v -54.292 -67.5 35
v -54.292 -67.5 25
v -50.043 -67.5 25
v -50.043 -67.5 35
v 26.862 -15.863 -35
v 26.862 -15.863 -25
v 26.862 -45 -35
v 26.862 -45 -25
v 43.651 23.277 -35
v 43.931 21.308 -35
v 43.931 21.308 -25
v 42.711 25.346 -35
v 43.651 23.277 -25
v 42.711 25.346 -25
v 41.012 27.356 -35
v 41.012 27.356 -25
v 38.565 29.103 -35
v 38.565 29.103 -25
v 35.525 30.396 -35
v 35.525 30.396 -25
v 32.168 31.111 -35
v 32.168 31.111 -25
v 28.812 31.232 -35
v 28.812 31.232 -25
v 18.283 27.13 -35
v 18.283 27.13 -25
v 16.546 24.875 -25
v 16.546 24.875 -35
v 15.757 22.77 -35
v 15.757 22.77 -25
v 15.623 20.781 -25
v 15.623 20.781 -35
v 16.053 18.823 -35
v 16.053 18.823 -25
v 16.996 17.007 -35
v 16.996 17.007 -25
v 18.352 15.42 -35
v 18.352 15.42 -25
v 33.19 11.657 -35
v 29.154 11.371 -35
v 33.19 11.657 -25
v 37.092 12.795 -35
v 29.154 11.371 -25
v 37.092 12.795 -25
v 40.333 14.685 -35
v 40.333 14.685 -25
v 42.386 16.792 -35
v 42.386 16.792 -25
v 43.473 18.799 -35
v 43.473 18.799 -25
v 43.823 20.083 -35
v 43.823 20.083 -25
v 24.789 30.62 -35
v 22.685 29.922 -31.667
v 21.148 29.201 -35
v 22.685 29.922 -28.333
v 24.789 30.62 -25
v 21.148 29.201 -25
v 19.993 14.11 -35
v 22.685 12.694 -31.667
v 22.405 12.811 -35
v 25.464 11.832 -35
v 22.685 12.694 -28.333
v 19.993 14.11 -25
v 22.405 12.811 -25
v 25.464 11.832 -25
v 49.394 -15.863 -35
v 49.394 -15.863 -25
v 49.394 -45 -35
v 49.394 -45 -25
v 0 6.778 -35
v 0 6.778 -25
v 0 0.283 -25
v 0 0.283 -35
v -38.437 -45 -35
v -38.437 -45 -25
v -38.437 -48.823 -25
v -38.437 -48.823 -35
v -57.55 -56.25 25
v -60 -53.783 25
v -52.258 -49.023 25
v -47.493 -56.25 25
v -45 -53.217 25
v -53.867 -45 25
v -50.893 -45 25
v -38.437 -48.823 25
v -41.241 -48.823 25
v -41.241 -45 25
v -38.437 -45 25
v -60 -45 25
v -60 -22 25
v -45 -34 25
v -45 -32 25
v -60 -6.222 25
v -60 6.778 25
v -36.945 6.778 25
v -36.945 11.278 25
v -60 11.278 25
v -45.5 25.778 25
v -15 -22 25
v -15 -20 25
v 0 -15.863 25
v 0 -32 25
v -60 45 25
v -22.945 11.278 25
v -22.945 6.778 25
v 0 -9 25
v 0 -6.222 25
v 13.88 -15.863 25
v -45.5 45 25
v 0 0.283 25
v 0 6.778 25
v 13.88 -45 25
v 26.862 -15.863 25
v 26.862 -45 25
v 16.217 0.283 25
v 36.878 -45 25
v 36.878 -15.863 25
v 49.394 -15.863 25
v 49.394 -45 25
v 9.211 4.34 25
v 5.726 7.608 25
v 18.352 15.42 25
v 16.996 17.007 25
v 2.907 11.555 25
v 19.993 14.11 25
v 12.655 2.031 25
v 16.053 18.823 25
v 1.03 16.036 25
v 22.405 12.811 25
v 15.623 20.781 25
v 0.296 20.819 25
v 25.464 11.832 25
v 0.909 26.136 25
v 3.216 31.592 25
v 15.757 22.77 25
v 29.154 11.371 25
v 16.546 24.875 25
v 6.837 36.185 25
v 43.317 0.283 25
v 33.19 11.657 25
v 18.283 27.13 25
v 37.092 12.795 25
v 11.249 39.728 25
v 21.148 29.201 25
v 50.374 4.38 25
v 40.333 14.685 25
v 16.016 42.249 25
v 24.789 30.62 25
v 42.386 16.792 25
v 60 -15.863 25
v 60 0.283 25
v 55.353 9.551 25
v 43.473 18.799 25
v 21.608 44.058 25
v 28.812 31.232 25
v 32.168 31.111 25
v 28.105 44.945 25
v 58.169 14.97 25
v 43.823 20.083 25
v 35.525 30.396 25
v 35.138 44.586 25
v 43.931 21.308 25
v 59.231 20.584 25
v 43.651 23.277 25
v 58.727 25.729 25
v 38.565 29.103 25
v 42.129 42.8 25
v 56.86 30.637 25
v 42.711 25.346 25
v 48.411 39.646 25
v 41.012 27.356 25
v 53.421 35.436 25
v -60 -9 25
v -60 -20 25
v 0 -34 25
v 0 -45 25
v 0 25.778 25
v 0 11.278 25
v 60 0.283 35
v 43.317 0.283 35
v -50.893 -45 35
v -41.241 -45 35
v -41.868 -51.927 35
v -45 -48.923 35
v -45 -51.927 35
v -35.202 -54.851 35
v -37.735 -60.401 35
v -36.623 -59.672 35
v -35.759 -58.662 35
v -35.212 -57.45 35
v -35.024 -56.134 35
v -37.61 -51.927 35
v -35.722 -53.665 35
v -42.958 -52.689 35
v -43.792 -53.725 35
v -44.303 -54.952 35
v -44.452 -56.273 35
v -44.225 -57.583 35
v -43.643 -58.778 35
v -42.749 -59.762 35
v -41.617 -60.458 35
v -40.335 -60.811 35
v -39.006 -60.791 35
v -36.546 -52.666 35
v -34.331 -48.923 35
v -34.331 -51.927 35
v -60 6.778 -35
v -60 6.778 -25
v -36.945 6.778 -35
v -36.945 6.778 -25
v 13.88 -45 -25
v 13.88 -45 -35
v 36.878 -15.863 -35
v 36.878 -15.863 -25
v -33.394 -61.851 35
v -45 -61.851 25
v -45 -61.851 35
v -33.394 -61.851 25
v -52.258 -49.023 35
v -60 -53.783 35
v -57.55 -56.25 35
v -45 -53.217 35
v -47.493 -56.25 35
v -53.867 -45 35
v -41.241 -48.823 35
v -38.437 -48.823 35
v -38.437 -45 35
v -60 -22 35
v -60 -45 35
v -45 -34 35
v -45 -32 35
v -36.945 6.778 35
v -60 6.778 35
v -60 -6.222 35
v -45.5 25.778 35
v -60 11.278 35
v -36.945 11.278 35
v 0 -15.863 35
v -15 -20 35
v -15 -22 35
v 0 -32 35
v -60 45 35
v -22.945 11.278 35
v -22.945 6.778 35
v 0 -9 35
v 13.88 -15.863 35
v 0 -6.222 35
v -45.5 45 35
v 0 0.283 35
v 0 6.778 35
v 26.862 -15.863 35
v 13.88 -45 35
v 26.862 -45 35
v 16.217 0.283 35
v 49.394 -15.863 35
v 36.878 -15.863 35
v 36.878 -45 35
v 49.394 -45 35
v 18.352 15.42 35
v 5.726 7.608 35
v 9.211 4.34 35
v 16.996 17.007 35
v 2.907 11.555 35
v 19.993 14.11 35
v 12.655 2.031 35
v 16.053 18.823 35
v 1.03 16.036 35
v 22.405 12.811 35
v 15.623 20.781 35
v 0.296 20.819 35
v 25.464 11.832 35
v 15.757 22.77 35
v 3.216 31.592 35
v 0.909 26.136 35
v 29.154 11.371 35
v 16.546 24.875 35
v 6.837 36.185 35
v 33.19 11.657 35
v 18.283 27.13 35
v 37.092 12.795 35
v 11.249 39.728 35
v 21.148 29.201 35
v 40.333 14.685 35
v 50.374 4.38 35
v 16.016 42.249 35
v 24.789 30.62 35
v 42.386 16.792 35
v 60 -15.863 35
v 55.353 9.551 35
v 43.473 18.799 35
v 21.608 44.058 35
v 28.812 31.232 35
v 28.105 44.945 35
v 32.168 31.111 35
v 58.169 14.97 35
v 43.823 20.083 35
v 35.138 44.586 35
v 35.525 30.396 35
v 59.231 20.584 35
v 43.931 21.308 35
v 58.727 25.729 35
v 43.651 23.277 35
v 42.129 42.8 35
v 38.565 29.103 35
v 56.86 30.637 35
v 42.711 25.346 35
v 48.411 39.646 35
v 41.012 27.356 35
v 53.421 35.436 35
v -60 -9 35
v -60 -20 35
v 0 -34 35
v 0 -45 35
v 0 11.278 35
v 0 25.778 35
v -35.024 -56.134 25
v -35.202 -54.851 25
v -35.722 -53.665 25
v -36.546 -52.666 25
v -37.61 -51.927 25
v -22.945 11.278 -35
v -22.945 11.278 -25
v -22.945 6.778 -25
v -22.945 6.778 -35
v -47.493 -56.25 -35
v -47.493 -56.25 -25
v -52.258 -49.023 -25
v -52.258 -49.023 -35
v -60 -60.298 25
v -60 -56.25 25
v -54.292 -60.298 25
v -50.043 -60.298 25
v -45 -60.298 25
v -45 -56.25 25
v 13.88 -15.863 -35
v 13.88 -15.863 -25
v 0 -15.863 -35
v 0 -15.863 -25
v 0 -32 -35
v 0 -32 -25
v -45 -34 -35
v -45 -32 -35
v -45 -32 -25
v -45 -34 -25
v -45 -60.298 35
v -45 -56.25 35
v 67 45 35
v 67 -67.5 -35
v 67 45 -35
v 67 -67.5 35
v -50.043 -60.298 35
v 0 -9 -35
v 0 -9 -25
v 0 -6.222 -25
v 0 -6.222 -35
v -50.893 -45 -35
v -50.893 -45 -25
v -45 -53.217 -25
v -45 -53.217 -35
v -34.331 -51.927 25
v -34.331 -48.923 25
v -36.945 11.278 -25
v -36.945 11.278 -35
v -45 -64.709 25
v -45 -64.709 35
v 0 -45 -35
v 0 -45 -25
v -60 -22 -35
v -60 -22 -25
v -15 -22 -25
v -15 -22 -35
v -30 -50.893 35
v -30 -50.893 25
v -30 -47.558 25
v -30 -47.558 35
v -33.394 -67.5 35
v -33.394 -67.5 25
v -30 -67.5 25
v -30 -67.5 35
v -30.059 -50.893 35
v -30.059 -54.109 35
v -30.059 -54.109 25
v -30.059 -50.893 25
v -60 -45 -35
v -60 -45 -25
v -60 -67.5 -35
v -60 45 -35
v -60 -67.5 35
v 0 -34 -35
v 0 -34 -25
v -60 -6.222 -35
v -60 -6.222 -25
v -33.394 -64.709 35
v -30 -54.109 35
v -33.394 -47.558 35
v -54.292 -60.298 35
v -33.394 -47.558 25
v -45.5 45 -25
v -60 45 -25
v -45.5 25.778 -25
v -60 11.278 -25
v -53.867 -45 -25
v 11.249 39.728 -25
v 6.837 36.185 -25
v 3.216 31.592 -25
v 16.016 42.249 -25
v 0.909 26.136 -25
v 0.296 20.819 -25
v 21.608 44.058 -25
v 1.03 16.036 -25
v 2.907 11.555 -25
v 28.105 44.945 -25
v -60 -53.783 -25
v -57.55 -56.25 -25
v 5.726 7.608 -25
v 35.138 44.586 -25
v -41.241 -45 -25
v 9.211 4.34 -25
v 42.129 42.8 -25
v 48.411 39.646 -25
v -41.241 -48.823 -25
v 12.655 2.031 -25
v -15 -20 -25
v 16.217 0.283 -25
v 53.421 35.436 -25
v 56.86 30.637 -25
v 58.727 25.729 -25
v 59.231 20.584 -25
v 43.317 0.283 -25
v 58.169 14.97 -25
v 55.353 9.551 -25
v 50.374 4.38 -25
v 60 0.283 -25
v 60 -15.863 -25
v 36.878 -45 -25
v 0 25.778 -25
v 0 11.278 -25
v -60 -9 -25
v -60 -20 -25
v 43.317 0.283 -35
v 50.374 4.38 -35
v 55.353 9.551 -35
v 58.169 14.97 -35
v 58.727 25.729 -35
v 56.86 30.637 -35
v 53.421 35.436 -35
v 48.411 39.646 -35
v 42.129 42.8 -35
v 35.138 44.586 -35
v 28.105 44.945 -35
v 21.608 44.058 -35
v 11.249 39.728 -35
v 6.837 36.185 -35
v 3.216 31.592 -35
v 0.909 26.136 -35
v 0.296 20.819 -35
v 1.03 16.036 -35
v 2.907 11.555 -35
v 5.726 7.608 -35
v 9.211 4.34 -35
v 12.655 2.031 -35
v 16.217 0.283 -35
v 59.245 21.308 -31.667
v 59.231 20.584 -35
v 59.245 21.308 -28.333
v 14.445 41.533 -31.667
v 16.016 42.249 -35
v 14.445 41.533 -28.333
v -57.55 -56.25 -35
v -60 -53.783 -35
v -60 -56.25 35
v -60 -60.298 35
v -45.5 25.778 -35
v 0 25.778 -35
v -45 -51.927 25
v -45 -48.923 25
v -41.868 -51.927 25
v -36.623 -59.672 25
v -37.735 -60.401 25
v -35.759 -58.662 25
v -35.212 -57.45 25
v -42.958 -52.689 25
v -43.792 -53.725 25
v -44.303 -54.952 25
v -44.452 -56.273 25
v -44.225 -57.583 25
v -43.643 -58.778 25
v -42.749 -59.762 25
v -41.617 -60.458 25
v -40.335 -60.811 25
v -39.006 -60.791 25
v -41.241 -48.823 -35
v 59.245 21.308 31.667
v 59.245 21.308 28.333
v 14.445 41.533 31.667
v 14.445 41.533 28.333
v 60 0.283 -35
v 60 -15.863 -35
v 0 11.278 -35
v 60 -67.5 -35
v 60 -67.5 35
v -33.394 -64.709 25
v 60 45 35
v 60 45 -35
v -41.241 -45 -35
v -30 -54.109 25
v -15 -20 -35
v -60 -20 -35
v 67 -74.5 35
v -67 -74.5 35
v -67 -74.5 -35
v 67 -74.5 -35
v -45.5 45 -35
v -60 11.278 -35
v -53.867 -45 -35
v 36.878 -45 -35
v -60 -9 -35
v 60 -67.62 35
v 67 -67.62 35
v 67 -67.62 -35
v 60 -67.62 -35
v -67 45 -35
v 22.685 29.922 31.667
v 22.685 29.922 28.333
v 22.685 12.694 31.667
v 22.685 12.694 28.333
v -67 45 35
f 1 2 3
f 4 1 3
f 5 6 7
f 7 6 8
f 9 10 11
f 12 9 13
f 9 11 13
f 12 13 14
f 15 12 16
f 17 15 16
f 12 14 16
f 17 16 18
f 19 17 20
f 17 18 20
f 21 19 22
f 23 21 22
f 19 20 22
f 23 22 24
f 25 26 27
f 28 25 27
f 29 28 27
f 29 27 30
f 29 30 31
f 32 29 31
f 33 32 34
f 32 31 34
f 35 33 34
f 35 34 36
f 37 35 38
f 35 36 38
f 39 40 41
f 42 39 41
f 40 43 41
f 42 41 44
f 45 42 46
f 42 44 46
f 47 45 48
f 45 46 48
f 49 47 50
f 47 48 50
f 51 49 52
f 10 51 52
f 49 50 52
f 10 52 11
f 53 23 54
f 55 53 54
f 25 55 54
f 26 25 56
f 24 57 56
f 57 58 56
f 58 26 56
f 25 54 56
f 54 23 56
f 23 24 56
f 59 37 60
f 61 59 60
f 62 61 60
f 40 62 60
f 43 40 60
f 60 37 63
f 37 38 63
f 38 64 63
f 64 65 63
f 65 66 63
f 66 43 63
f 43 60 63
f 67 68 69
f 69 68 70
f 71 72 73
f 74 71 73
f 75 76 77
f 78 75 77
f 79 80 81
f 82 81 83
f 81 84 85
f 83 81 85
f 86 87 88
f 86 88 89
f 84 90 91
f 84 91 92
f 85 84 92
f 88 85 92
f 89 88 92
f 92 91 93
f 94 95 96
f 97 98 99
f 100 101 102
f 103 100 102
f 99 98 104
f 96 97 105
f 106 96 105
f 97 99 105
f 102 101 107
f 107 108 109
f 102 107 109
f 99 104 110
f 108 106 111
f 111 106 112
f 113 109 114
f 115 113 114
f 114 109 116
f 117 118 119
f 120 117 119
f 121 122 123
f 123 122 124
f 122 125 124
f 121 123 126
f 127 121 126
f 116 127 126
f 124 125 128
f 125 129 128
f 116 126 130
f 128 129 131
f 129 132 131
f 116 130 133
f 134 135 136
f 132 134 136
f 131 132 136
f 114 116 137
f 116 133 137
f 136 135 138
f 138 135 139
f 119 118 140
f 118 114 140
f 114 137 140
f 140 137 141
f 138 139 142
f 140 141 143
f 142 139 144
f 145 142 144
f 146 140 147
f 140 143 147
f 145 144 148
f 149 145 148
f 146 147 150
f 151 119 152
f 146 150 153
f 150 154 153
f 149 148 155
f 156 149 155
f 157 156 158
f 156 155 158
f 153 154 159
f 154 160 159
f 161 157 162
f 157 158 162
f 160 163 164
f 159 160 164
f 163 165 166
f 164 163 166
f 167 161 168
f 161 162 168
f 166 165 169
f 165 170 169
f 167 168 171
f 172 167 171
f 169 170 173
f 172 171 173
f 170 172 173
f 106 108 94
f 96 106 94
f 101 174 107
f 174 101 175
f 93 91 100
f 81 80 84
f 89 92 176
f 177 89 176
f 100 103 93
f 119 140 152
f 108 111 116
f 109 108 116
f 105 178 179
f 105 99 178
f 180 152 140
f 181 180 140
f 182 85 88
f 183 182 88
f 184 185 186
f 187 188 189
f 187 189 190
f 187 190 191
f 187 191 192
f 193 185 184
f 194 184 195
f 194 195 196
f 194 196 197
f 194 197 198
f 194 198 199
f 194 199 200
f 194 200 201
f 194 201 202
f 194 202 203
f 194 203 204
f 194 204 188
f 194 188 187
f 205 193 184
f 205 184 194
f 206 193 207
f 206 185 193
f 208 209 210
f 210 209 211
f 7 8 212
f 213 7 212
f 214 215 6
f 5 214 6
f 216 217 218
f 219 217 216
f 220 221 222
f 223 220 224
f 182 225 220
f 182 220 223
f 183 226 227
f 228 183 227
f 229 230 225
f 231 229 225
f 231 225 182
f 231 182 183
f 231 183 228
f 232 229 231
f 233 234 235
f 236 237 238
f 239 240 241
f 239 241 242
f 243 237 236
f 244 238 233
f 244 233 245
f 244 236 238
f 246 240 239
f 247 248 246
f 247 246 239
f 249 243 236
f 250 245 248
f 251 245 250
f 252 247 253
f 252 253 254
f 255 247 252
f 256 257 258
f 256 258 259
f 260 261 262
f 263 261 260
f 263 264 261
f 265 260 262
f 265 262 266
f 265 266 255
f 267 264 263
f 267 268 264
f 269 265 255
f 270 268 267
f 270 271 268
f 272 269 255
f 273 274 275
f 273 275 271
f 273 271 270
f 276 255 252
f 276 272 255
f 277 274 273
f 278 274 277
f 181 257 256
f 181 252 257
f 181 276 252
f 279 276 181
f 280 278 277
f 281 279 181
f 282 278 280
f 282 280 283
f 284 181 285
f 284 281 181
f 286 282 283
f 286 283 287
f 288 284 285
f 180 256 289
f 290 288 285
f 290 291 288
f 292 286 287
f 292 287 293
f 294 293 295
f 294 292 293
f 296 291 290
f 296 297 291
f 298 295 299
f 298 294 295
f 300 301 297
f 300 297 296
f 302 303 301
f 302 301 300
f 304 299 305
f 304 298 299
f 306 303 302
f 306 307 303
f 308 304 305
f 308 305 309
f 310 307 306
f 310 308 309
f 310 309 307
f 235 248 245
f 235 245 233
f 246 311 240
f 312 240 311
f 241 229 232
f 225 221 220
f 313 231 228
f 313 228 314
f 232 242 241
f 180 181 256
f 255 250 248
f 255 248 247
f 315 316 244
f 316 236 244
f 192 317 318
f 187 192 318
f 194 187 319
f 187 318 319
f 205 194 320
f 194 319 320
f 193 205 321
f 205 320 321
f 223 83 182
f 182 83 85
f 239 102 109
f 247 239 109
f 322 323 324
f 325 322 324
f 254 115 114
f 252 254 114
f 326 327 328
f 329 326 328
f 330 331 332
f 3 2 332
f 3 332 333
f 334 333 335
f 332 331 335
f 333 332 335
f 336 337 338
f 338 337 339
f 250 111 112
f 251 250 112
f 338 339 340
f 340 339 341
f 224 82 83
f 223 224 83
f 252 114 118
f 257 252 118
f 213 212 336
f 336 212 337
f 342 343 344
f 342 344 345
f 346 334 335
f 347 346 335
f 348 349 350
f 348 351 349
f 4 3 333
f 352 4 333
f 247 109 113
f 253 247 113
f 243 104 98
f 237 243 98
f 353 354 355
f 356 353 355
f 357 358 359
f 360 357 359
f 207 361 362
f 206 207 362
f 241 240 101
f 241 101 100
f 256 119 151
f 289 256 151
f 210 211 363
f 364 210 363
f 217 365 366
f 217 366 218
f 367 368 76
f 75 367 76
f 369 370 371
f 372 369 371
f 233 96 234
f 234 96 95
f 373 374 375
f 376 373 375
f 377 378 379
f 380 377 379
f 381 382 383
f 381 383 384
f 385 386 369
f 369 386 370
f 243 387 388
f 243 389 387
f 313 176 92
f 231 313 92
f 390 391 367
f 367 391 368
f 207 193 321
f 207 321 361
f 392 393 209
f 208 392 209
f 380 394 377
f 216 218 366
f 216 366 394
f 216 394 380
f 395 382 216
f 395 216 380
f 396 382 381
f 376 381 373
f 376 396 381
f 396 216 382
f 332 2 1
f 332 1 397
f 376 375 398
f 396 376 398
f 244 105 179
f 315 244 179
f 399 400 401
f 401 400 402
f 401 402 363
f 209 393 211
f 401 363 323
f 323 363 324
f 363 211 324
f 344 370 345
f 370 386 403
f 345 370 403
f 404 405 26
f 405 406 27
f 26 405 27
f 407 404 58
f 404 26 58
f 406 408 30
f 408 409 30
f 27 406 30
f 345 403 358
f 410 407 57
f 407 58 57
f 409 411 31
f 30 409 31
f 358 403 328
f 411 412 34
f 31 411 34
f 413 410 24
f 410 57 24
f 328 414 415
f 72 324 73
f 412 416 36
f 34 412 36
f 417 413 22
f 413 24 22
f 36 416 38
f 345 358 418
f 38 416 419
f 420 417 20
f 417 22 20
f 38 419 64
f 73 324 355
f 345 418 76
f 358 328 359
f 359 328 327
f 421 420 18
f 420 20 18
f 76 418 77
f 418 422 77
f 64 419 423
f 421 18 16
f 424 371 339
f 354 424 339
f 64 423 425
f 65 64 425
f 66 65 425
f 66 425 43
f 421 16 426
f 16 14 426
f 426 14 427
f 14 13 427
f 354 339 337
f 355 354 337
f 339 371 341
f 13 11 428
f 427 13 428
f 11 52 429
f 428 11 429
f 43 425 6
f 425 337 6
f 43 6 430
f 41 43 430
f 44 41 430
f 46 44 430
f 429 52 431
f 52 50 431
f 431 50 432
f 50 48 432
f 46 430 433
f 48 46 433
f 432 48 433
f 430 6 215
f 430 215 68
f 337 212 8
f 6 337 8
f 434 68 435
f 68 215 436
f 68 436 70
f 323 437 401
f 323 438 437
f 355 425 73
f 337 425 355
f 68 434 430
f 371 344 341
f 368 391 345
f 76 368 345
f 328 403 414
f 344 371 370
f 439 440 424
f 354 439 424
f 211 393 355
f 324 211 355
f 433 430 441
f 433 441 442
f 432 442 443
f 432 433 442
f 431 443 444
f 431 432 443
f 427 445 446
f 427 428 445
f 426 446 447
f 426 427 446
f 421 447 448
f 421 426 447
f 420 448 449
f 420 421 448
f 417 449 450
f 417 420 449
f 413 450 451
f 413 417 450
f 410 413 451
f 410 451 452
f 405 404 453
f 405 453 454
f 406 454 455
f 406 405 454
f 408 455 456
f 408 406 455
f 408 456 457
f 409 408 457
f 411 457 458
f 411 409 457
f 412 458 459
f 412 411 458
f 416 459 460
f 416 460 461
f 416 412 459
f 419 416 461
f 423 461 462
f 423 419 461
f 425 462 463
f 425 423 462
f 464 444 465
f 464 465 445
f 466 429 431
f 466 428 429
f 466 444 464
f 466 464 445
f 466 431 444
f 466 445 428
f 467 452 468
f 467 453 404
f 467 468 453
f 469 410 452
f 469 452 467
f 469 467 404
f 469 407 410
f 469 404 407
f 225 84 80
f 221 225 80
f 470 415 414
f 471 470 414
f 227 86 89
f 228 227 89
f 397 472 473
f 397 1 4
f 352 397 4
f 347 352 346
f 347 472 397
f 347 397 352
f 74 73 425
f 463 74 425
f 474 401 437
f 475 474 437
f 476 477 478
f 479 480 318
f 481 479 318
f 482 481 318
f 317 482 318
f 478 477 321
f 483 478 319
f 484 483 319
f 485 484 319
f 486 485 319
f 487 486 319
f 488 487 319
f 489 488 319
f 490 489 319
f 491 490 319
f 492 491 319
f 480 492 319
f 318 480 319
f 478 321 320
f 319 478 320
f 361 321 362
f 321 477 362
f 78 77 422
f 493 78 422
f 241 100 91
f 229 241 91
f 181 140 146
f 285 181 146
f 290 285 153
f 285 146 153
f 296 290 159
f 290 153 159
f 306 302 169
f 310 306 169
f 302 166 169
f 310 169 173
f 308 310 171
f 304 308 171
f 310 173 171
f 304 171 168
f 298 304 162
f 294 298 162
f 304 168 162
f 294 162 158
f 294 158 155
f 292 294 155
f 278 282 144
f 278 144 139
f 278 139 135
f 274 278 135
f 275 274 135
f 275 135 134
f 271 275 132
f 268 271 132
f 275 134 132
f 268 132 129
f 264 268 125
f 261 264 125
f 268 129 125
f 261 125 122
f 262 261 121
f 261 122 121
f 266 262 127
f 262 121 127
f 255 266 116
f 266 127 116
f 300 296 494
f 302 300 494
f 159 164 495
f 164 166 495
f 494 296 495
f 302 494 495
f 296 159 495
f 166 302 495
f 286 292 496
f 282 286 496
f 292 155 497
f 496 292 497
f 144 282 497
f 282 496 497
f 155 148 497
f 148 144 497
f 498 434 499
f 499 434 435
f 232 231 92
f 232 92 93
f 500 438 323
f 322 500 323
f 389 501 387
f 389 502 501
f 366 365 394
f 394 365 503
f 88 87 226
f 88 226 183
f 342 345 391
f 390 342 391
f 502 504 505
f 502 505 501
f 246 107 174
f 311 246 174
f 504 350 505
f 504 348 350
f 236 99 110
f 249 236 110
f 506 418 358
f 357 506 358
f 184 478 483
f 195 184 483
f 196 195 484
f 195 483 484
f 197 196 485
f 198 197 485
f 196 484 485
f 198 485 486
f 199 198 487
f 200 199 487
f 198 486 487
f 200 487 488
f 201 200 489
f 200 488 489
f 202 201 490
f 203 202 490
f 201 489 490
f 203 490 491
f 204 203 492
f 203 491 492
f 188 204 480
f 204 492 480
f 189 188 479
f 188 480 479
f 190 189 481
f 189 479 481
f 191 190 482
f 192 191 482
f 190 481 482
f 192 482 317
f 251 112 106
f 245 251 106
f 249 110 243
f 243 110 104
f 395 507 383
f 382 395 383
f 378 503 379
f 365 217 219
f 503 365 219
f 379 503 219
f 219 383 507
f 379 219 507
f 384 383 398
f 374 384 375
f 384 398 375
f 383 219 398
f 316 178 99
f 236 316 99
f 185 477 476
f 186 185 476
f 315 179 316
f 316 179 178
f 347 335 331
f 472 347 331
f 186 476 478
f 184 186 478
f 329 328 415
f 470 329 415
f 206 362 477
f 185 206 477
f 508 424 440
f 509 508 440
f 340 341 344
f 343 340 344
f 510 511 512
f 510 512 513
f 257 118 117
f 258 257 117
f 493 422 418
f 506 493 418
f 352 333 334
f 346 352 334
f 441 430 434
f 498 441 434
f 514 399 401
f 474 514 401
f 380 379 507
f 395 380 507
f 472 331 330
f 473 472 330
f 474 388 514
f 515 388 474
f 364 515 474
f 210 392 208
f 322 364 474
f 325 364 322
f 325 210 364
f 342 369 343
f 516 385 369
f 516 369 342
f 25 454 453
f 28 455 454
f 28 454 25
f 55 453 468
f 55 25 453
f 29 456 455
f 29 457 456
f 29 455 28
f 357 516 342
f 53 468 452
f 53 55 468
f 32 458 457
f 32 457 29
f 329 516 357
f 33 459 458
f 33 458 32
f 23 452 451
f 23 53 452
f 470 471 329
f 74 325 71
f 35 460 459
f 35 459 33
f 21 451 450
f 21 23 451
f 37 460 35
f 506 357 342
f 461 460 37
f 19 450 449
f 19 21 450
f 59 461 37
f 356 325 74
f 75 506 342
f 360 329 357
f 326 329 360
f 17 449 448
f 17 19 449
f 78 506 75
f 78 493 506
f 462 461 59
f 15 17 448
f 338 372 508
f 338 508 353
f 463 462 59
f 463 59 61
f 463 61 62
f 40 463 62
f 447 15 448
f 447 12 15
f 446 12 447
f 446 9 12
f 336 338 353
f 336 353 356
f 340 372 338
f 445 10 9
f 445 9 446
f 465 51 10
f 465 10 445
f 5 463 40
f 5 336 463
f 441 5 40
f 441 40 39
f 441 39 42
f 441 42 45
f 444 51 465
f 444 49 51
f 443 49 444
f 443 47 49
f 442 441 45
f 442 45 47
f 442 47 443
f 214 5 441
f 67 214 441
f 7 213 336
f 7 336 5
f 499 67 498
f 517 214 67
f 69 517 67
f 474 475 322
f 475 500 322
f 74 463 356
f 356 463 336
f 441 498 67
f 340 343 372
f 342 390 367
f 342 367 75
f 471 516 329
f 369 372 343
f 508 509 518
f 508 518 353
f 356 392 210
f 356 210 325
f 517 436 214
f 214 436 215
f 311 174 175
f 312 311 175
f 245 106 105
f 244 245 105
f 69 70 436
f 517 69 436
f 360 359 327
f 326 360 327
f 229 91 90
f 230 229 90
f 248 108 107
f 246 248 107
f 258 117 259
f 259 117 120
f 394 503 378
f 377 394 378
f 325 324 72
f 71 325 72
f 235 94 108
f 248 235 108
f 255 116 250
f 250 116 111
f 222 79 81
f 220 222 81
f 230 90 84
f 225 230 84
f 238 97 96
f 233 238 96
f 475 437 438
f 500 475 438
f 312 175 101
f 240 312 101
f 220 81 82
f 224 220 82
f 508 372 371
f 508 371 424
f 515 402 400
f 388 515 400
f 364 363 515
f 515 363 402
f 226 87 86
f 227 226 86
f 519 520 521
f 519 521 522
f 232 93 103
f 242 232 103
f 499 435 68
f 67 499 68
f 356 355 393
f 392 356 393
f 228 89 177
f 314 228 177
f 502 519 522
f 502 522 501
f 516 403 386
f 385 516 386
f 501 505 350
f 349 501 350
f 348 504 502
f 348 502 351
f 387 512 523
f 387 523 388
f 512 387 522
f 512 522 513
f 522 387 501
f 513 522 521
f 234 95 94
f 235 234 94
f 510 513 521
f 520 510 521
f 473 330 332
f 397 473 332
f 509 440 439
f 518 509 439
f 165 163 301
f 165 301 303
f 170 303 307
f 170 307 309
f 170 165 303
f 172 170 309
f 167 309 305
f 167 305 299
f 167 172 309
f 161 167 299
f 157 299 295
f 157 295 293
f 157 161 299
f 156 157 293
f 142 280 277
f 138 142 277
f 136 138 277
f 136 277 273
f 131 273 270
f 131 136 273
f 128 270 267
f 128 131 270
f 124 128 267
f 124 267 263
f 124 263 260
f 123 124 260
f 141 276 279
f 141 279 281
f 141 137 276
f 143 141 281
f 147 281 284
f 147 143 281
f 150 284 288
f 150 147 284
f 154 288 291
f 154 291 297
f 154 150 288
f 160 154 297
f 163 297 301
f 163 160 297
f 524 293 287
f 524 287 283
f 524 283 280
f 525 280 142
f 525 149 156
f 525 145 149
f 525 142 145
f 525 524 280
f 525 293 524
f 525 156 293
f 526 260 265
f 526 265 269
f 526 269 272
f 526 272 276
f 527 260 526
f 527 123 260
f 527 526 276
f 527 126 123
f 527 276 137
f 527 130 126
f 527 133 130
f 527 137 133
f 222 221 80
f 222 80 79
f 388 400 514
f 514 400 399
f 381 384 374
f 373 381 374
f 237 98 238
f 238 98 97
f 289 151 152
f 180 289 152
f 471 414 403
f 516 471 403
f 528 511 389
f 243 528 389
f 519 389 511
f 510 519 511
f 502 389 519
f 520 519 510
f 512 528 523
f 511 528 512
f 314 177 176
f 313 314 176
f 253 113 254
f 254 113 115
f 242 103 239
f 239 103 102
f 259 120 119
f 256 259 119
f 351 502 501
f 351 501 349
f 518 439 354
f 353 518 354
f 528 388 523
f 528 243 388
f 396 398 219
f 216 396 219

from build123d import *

# Parameters (mm, degrees)
F1_START = 25
F0_W     = 2.8042644262
F0_H     = 3.8227754831
F1_DEPTH = 10
F0_W_2   = 4.249099642
F0_H_2   = 7.2016502917
F0_W_3   = 0.595510006
F0_H_3   = 2.8584450483
F0_W_4   = 11.6058085859
F2_DEPTH = 35
F3_START = 50
F3_DEPTH = 10


with BuildPart() as f1:
    # F0 (on Top) → F1 (new body)
    with BuildSketch(Plane.XY.offset(F1_START)):
        Polygon((-45.5, 45), (-60, 45), (-60, 11.2783805579), (-36.944876343, 11.2783805579), (-36.944876343, 6.7783805579), (-60, 6.7783805579), (-60, -6.2216194421), (0, -6.2216194421), (0, 0.2832732425), (0, 6.7783805579), (-22.944876343, 6.7783805579), (-22.944876343, 11.2783805579), (0, 11.2783805579), (0, 25.7783805579), (-45.5, 25.7783805579), align=None)
        Polygon((0, -9), (-60, -9), (-60, -20), (-15, -20), (-15, -22), (-60, -22), (-60, -45), (-53.8670122623, -45), (-50.8926399052, -45), (-45, -45), (-41.241299361, -45), (-38.4370349348, -45), (-30, -45), (-15, -45), (0, -45), (0, -34), (-45, -34), (-45, -32), (0, -32), (0, -15.863308683), align=None)
        with BuildLine():
            Line((60, -15.863308683), (60, 0.2832732425))
            Line((60, 0.2832732425), (43.3172393359, 0.2832732425))
            add(Edge.make_bspline(
                [(16.2171352886, 0.2832732425), (29.7671873122, -5.3493892775), (43.3172393359, 0.2832732425)],
                knots=[4.2347657185, 4.2347657185, 4.2347657185, 5.1900122422, 5.1900122422, 5.1900122422], degree=2, weights=[1, 0.8880899447, 1]))
            Line((16.2171352886, 0.2832732425), (0, 0.2832732425))
            Line((0, 0.2832732425), (0, -6.2216194421))
            Line((0, -6.2216194421), (0, -9))
            Line((0, -9), (0, -15.863308683))
            Line((0, -15.863308683), (13.8803962618, -15.863308683))
            Line((13.8803962618, -15.863308683), (26.8623735756, -15.863308683))
            Line((26.8623735756, -15.863308683), (36.8775986135, -15.863308683))
            Line((36.8775986135, -15.863308683), (49.3936762214, -15.863308683))
            Line((49.3936762214, -15.863308683), (60, -15.863308683))
        make_face()
        with BuildLine():
            Line((16.2171352886, 0.2832732425), (43.3172393359, 0.2832732425))
            add(Edge.make_bspline(
                [(43.3172393359, 0.2832732425), (59.2449872969, 6.9043274505), (59.2449872969, 21.3082656264)],
                knots=[5.1900122422, 5.1900122422, 5.1900122422, 6.2831853072, 6.2831853072, 6.2831853072], degree=2, weights=[1, 0.8543037278, 1]))
            add(Edge.make_bspline(
                [(59.2449872969, 21.3082656264), (59.2449872969, 63.4241222907), (14.4453896272, 41.5333897572), (-30.3542080425, 19.6426572236), (16.2171352886, 0.2832732425)],
                knots=[0, 0, 0, 2.1173828593, 2.1173828593, 4.2347657185, 4.2347657185, 4.2347657185], degree=2, weights=[1, 0.4900132015, 1, 0.4900132015, 1]))
        make_face()
        with BuildLine():
            add(Edge.make_bspline(
                [(43.9308546484, 21.3082656264), (43.9308546484, 38.5360179263), (22.6853536442, 29.9221417764), (1.43985264, 21.3082656264), (22.6853536442, 12.6943894765), (43.9308546484, 4.0805133266), (43.9308546484, 21.3082656264)],
                knots=[0, 0, 0, 2.0943951024, 2.0943951024, 4.1887902048, 4.1887902048, 6.2831853072, 6.2831853072, 6.2831853072], degree=2, weights=[1, 0.5, 1, 0.5, 1, 0.5, 1]))
        make_face(mode=Mode.SUBTRACT)
        with BuildLine():
            add(Edge.make_bspline(
                [(16.2171352886, 0.2832732425), (29.7671873122, -5.3493892775), (43.3172393359, 0.2832732425)],
                knots=[4.2347657185, 4.2347657185, 4.2347657185, 5.1900122422, 5.1900122422, 5.1900122422], degree=2, weights=[1, 0.8880899447, 1]))
            Line((43.3172393359, 0.2832732425), (16.2171352886, 0.2832732425))
        make_face()
        Polygon((26.8623735756, -15.863308683), (13.8803962618, -15.863308683), (13.8803962618, -45), (15, -45), (26.8623735756, -45), align=None)
        Polygon((49.3936762214, -45), (49.3936762214, -15.863308683), (36.8775986135, -15.863308683), (36.8775986135, -45), (45, -45), align=None)
        Polygon((-53.8670122623, -45), (-60, -53.7830591202), (-57.5495660305, -56.25), (-52.2580482066, -49.0230806172), (-47.4933609366, -56.25), (-45, -53.2165132463), (-50.8926399052, -45), align=None)
        with Locations((-39.8391671479, -46.9113877416)):
            Rectangle(F0_W, F0_H)
    extrude(amount=F1_DEPTH)


with BuildPart() as f1b:
    # F0 (on Top) → F1, piece 2 (new body)
    with BuildSketch(Plane.XY.offset(F1_START)):
        Polygon((-60, -56.25), (-60, -60.2983497083), (-54.2919225991, -60.2983497083), (-50.042822957, -60.2983497083), (-45, -60.2983497083), (-45, -56.25), (-47.4933609366, -56.25), (-57.5495660305, -56.25), align=None)
        with Locations((-52.1673727781, -63.8991748542)):
            Rectangle(F0_W_2, F0_H_2)
    extrude(amount=F1_DEPTH)


with BuildPart() as f1c:
    # F0 (on Top) → F1, piece 3 (new body)
    with BuildSketch(Plane.XY.offset(F1_START)):
        with BuildLine():
            Line((-37.6097518513, -51.9274957478), (-41.8682735851, -51.9274957478))
            ThreePointArc((-41.8682735851, -51.9274957478), (-42.2077062115, -60.1504925618), (-35.0244051495, -56.1338923872))
            ThreePointArc((-35.0244051495, -56.1338923872), (-35.7224125436, -53.6651988938), (-37.6097518513, -51.9274957478))
        make_face()
        with BuildLine():
            Line((-45, -48.9229299128), (-45, -51.9274957478))
            Line((-45, -51.9274957478), (-41.8682735851, -51.9274957478))
            ThreePointArc((-41.8682735851, -51.9274957478), (-39.7390127182, -51.4192848184), (-37.6097518513, -51.9274957478))
            Line((-37.6097518513, -51.9274957478), (-34.3307927251, -51.9274957478))
            Line((-34.3307927251, -51.9274957478), (-34.3307927251, -48.9229299128))
            Line((-34.3307927251, -48.9229299128), (-45, -48.9229299128))
        make_face()
        with BuildLine():
            ThreePointArc((-37.6097518513, -51.9274957478), (-39.7390127182, -51.4192848184), (-41.8682735851, -51.9274957478))
            Line((-41.8682735851, -51.9274957478), (-37.6097518513, -51.9274957478))
        make_face()
    extrude(amount=F1_DEPTH)


with BuildPart() as f1d:
    # F0 (on Top) → F1, piece 4 (new body)
    with BuildSketch(Plane.XY.offset(F1_START)):
        Polygon((-33.3941914141, -64.7091567516), (-33.3941914141, -67.5), (-30, -67.5), (-30, -54.1090965271), (-30.0593413413, -54.1090965271), (-30.0593413413, -50.8933477104), (-30, -50.8933477104), (-30, -47.5584976375), (-33.3941914141, -47.5584976375), (-33.3941914141, -61.8507117033), (-32.7986814082, -61.8507117033), (-32.7986814082, -64.7091567516), align=None)
        with Locations((-33.0964364111, -63.2799342275)):
            Rectangle(F0_W_3, F0_H_3)
        with Locations((-39.1970957071, -63.2799342275)):
            Rectangle(F0_W_4, F0_H_3)
    extrude(amount=F1_DEPTH)


with BuildPart() as f2:
    # F0 (on Top) → F2 (new body, symmetric)
    with BuildSketch(Plane.XY):
        Polygon((-60, 11.2783805579), (-60, 45), (-67, 45), (-67, -67.5), (-60, -67.5), (-60, -60.2983497083), (-60, -56.25), (-60, -53.7830591202), (-60, -45), (-60, -22), (-60, -20), (-60, -9), (-60, -6.2216194421), (-60, 6.7783805579), align=None)
        Polygon((-60, -67.5), (-67, -67.5), (-67, -74.5), (67, -74.5), (67, -67.6197633147), (60, -67.6197633147), (60, -67.5), (45, -67.5), (30, -67.5), (15, -67.5), (-15, -67.5), (-30, -67.5), (-33.3941914141, -67.5), (-45, -67.5), (-50.042822957, -67.5), (-54.2919225991, -67.5), align=None)
    extrude(amount=F2_DEPTH, both=True)


with BuildPart() as f2b:
    # F0 (on Top) → F2, piece 2 (new body, symmetric)
    with BuildSketch(Plane.XY):
        Polygon((67, 45), (60, 45), (60, 0.2832732425), (60, -15.863308683), (60, -45), (60, -67.5), (67, -67.5), align=None)
    extrude(amount=F2_DEPTH, both=True)


with BuildPart() as f3:
    # F1_face (on face) → F3 (new body)
    with BuildSketch(Plane(origin=(-3.5850456834, -3.1671407967, 25), x_dir=(1, 0, 0), z_dir=(0, 0, -1)).offset(F3_START)):
        with BuildLine():
            Line((-41.9149543166, -28.9455213546), (3.5850456834, -28.9455213546))
            Line((3.5850456834, -28.9455213546), (3.5850456834, -14.4455213546))
            Line((3.5850456834, -14.4455213546), (-19.3598306596, -14.4455213546))
            Line((-19.3598306596, -14.4455213546), (-19.3598306596, -9.9455213546))
            Line((-19.3598306596, -9.9455213546), (3.5850456834, -9.9455213546))
            Line((3.5850456834, -9.9455213546), (3.5850456834, -3.4504140392))
            Line((3.5850456834, -3.4504140392), (19.802180972, -3.4504140392))
            add(Edge.make_bspline(
                [(46.9022850193, -3.4504140392), (52.3451388026, -5.7129705559), (57.5426912766, -9.3262859045), (61.223618178, -14.1851937838), (62.8300329803, -19.5532711917), (62.8300329803, -32.7303367264), (57.8298847199, -45.2516703649), (42.7295689922, -52.0688244441), (26.8113930228, -48.9912297267), (9.2494775985, -40.409831381), (-1.4708030001, -30.4708956345), (-0.8736119478, -16.5669809663), (10.6739517544, -7.2449555287), (19.802180972, -3.4504140392)],
                knots=[5.1900122422, 5.1900122422, 5.1900122422, 5.1900122422, 5.1900122422, 5.1900122422, 6.2831853072, 6.2831853072, 6.2831853072, 6.2831853072, 8.1165496981, 8.1165496981, 8.1165496981, 8.1165496981, 9.9499140891, 9.9499140891, 9.9499140891, 9.9499140891, 9.9499140891, 9.9499140891], degree=5, weights=[1, 1, 0.9915090385, 0.9915090385, 1, 1, 0.8959653861, 0.8959653861, 1, 1, 0.8959653861, 0.8959653861, 1, 1]))
            Line((46.9022850193, -3.4504140392), (63.5850456834, -3.4504140392))
            Line((63.5850456834, -3.4504140392), (63.5850456834, 12.6961678864))
            Line((63.5850456834, 12.6961678864), (52.9787219048, 12.6961678864))
            Line((52.9787219048, 12.6961678864), (52.9787219048, 41.8328592033))
            Line((52.9787219048, 41.8328592033), (40.4626442969, 41.8328592033))
            Line((40.4626442969, 41.8328592033), (40.4626442969, 12.6961678864))
            Line((40.4626442969, 12.6961678864), (30.447419259, 12.6961678864))
            Line((30.447419259, 12.6961678864), (30.447419259, 41.8328592033))
            Line((30.447419259, 41.8328592033), (17.4654419452, 41.8328592033))
            Line((17.4654419452, 41.8328592033), (17.4654419452, 12.6961678864))
            Line((17.4654419452, 12.6961678864), (3.5850456834, 12.6961678864))
            Line((3.5850456834, 12.6961678864), (3.5850456834, 28.8328592033))
            Line((3.5850456834, 28.8328592033), (-41.4149543166, 28.8328592033))
            Line((-41.4149543166, 28.8328592033), (-41.4149543166, 30.8328592033))
            Line((-41.4149543166, 30.8328592033), (3.5850456834, 30.8328592033))
            Line((3.5850456834, 30.8328592033), (3.5850456834, 41.8328592033))
            Line((3.5850456834, 41.8328592033), (-34.8519892513, 41.8328592033))
            Line((-34.8519892513, 41.8328592033), (-34.8519892513, 45.6556346865))
            Line((-34.8519892513, 45.6556346865), (-37.6562536776, 45.6556346865))
            Line((-37.6562536776, 45.6556346865), (-37.6562536776, 41.8328592033))
            Line((-37.6562536776, 41.8328592033), (-47.3075942218, 41.8328592033))
            Line((-47.3075942218, 41.8328592033), (-41.4149543166, 50.0493724496))
            Line((-41.4149543166, 50.0493724496), (-43.9083152532, 53.0828592033))
            Line((-43.9083152532, 53.0828592033), (-48.6730025232, 45.8559398205))
            Line((-48.6730025232, 45.8559398205), (-53.9645203471, 53.0828592033))
            Line((-53.9645203471, 53.0828592033), (-56.4149543166, 50.6159183235))
            Line((-56.4149543166, 50.6159183235), (-50.2819665789, 41.8328592033))
            Line((-50.2819665789, 41.8328592033), (-56.4149543166, 41.8328592033))
            Line((-56.4149543166, 41.8328592033), (-56.4149543166, 18.8328592033))
            Line((-56.4149543166, 18.8328592033), (-11.4149543166, 18.8328592033))
            Line((-11.4149543166, 18.8328592033), (-11.4149543166, 16.8328592033))
            Line((-11.4149543166, 16.8328592033), (-56.4149543166, 16.8328592033))
            Line((-56.4149543166, 16.8328592033), (-56.4149543166, 5.8328592033))
            Line((-56.4149543166, 5.8328592033), (3.5850456834, 5.8328592033))
            Line((3.5850456834, 5.8328592033), (3.5850456834, 3.0544786454))
            Line((3.5850456834, 3.0544786454), (-56.4149543166, 3.0544786454))
            Line((-56.4149543166, 3.0544786454), (-56.4149543166, -9.9455213546))
            Line((-56.4149543166, -9.9455213546), (-33.3598306596, -9.9455213546))
            Line((-33.3598306596, -9.9455213546), (-33.3598306596, -14.4455213546))
            Line((-33.3598306596, -14.4455213546), (-56.4149543166, -14.4455213546))
            Line((-56.4149543166, -14.4455213546), (-56.4149543166, -48.1671407967))
            Line((-56.4149543166, -48.1671407967), (-41.9149543166, -48.1671407967))
            Line((-41.9149543166, -48.1671407967), (-41.9149543166, -28.9455213546))
        make_face()
        with BuildLine():
            add(Edge.make_bspline(
                [(47.5159003318, -24.4754064231), (47.5159003318, -41.703158723), (26.2703993276, -33.089282573), (5.0248983234, -24.4754064231), (26.2703993276, -15.8615302732), (47.5159003318, -7.2476541232), (47.5159003318, -24.4754064231)],
                knots=[0, 0, 0, 2.0943951024, 2.0943951024, 4.1887902048, 4.1887902048, 6.2831853072, 6.2831853072, 6.2831853072], degree=2, weights=[1, 0.5, 1, 0.5, 1, 0.5, 1]))
        make_face(mode=Mode.SUBTRACT)
    extrude(amount=F3_DEPTH)


solid = Compound([f1.part, f1b.part, f1c.part, f1d.part, f2.part, f2b.part, f3.part])
